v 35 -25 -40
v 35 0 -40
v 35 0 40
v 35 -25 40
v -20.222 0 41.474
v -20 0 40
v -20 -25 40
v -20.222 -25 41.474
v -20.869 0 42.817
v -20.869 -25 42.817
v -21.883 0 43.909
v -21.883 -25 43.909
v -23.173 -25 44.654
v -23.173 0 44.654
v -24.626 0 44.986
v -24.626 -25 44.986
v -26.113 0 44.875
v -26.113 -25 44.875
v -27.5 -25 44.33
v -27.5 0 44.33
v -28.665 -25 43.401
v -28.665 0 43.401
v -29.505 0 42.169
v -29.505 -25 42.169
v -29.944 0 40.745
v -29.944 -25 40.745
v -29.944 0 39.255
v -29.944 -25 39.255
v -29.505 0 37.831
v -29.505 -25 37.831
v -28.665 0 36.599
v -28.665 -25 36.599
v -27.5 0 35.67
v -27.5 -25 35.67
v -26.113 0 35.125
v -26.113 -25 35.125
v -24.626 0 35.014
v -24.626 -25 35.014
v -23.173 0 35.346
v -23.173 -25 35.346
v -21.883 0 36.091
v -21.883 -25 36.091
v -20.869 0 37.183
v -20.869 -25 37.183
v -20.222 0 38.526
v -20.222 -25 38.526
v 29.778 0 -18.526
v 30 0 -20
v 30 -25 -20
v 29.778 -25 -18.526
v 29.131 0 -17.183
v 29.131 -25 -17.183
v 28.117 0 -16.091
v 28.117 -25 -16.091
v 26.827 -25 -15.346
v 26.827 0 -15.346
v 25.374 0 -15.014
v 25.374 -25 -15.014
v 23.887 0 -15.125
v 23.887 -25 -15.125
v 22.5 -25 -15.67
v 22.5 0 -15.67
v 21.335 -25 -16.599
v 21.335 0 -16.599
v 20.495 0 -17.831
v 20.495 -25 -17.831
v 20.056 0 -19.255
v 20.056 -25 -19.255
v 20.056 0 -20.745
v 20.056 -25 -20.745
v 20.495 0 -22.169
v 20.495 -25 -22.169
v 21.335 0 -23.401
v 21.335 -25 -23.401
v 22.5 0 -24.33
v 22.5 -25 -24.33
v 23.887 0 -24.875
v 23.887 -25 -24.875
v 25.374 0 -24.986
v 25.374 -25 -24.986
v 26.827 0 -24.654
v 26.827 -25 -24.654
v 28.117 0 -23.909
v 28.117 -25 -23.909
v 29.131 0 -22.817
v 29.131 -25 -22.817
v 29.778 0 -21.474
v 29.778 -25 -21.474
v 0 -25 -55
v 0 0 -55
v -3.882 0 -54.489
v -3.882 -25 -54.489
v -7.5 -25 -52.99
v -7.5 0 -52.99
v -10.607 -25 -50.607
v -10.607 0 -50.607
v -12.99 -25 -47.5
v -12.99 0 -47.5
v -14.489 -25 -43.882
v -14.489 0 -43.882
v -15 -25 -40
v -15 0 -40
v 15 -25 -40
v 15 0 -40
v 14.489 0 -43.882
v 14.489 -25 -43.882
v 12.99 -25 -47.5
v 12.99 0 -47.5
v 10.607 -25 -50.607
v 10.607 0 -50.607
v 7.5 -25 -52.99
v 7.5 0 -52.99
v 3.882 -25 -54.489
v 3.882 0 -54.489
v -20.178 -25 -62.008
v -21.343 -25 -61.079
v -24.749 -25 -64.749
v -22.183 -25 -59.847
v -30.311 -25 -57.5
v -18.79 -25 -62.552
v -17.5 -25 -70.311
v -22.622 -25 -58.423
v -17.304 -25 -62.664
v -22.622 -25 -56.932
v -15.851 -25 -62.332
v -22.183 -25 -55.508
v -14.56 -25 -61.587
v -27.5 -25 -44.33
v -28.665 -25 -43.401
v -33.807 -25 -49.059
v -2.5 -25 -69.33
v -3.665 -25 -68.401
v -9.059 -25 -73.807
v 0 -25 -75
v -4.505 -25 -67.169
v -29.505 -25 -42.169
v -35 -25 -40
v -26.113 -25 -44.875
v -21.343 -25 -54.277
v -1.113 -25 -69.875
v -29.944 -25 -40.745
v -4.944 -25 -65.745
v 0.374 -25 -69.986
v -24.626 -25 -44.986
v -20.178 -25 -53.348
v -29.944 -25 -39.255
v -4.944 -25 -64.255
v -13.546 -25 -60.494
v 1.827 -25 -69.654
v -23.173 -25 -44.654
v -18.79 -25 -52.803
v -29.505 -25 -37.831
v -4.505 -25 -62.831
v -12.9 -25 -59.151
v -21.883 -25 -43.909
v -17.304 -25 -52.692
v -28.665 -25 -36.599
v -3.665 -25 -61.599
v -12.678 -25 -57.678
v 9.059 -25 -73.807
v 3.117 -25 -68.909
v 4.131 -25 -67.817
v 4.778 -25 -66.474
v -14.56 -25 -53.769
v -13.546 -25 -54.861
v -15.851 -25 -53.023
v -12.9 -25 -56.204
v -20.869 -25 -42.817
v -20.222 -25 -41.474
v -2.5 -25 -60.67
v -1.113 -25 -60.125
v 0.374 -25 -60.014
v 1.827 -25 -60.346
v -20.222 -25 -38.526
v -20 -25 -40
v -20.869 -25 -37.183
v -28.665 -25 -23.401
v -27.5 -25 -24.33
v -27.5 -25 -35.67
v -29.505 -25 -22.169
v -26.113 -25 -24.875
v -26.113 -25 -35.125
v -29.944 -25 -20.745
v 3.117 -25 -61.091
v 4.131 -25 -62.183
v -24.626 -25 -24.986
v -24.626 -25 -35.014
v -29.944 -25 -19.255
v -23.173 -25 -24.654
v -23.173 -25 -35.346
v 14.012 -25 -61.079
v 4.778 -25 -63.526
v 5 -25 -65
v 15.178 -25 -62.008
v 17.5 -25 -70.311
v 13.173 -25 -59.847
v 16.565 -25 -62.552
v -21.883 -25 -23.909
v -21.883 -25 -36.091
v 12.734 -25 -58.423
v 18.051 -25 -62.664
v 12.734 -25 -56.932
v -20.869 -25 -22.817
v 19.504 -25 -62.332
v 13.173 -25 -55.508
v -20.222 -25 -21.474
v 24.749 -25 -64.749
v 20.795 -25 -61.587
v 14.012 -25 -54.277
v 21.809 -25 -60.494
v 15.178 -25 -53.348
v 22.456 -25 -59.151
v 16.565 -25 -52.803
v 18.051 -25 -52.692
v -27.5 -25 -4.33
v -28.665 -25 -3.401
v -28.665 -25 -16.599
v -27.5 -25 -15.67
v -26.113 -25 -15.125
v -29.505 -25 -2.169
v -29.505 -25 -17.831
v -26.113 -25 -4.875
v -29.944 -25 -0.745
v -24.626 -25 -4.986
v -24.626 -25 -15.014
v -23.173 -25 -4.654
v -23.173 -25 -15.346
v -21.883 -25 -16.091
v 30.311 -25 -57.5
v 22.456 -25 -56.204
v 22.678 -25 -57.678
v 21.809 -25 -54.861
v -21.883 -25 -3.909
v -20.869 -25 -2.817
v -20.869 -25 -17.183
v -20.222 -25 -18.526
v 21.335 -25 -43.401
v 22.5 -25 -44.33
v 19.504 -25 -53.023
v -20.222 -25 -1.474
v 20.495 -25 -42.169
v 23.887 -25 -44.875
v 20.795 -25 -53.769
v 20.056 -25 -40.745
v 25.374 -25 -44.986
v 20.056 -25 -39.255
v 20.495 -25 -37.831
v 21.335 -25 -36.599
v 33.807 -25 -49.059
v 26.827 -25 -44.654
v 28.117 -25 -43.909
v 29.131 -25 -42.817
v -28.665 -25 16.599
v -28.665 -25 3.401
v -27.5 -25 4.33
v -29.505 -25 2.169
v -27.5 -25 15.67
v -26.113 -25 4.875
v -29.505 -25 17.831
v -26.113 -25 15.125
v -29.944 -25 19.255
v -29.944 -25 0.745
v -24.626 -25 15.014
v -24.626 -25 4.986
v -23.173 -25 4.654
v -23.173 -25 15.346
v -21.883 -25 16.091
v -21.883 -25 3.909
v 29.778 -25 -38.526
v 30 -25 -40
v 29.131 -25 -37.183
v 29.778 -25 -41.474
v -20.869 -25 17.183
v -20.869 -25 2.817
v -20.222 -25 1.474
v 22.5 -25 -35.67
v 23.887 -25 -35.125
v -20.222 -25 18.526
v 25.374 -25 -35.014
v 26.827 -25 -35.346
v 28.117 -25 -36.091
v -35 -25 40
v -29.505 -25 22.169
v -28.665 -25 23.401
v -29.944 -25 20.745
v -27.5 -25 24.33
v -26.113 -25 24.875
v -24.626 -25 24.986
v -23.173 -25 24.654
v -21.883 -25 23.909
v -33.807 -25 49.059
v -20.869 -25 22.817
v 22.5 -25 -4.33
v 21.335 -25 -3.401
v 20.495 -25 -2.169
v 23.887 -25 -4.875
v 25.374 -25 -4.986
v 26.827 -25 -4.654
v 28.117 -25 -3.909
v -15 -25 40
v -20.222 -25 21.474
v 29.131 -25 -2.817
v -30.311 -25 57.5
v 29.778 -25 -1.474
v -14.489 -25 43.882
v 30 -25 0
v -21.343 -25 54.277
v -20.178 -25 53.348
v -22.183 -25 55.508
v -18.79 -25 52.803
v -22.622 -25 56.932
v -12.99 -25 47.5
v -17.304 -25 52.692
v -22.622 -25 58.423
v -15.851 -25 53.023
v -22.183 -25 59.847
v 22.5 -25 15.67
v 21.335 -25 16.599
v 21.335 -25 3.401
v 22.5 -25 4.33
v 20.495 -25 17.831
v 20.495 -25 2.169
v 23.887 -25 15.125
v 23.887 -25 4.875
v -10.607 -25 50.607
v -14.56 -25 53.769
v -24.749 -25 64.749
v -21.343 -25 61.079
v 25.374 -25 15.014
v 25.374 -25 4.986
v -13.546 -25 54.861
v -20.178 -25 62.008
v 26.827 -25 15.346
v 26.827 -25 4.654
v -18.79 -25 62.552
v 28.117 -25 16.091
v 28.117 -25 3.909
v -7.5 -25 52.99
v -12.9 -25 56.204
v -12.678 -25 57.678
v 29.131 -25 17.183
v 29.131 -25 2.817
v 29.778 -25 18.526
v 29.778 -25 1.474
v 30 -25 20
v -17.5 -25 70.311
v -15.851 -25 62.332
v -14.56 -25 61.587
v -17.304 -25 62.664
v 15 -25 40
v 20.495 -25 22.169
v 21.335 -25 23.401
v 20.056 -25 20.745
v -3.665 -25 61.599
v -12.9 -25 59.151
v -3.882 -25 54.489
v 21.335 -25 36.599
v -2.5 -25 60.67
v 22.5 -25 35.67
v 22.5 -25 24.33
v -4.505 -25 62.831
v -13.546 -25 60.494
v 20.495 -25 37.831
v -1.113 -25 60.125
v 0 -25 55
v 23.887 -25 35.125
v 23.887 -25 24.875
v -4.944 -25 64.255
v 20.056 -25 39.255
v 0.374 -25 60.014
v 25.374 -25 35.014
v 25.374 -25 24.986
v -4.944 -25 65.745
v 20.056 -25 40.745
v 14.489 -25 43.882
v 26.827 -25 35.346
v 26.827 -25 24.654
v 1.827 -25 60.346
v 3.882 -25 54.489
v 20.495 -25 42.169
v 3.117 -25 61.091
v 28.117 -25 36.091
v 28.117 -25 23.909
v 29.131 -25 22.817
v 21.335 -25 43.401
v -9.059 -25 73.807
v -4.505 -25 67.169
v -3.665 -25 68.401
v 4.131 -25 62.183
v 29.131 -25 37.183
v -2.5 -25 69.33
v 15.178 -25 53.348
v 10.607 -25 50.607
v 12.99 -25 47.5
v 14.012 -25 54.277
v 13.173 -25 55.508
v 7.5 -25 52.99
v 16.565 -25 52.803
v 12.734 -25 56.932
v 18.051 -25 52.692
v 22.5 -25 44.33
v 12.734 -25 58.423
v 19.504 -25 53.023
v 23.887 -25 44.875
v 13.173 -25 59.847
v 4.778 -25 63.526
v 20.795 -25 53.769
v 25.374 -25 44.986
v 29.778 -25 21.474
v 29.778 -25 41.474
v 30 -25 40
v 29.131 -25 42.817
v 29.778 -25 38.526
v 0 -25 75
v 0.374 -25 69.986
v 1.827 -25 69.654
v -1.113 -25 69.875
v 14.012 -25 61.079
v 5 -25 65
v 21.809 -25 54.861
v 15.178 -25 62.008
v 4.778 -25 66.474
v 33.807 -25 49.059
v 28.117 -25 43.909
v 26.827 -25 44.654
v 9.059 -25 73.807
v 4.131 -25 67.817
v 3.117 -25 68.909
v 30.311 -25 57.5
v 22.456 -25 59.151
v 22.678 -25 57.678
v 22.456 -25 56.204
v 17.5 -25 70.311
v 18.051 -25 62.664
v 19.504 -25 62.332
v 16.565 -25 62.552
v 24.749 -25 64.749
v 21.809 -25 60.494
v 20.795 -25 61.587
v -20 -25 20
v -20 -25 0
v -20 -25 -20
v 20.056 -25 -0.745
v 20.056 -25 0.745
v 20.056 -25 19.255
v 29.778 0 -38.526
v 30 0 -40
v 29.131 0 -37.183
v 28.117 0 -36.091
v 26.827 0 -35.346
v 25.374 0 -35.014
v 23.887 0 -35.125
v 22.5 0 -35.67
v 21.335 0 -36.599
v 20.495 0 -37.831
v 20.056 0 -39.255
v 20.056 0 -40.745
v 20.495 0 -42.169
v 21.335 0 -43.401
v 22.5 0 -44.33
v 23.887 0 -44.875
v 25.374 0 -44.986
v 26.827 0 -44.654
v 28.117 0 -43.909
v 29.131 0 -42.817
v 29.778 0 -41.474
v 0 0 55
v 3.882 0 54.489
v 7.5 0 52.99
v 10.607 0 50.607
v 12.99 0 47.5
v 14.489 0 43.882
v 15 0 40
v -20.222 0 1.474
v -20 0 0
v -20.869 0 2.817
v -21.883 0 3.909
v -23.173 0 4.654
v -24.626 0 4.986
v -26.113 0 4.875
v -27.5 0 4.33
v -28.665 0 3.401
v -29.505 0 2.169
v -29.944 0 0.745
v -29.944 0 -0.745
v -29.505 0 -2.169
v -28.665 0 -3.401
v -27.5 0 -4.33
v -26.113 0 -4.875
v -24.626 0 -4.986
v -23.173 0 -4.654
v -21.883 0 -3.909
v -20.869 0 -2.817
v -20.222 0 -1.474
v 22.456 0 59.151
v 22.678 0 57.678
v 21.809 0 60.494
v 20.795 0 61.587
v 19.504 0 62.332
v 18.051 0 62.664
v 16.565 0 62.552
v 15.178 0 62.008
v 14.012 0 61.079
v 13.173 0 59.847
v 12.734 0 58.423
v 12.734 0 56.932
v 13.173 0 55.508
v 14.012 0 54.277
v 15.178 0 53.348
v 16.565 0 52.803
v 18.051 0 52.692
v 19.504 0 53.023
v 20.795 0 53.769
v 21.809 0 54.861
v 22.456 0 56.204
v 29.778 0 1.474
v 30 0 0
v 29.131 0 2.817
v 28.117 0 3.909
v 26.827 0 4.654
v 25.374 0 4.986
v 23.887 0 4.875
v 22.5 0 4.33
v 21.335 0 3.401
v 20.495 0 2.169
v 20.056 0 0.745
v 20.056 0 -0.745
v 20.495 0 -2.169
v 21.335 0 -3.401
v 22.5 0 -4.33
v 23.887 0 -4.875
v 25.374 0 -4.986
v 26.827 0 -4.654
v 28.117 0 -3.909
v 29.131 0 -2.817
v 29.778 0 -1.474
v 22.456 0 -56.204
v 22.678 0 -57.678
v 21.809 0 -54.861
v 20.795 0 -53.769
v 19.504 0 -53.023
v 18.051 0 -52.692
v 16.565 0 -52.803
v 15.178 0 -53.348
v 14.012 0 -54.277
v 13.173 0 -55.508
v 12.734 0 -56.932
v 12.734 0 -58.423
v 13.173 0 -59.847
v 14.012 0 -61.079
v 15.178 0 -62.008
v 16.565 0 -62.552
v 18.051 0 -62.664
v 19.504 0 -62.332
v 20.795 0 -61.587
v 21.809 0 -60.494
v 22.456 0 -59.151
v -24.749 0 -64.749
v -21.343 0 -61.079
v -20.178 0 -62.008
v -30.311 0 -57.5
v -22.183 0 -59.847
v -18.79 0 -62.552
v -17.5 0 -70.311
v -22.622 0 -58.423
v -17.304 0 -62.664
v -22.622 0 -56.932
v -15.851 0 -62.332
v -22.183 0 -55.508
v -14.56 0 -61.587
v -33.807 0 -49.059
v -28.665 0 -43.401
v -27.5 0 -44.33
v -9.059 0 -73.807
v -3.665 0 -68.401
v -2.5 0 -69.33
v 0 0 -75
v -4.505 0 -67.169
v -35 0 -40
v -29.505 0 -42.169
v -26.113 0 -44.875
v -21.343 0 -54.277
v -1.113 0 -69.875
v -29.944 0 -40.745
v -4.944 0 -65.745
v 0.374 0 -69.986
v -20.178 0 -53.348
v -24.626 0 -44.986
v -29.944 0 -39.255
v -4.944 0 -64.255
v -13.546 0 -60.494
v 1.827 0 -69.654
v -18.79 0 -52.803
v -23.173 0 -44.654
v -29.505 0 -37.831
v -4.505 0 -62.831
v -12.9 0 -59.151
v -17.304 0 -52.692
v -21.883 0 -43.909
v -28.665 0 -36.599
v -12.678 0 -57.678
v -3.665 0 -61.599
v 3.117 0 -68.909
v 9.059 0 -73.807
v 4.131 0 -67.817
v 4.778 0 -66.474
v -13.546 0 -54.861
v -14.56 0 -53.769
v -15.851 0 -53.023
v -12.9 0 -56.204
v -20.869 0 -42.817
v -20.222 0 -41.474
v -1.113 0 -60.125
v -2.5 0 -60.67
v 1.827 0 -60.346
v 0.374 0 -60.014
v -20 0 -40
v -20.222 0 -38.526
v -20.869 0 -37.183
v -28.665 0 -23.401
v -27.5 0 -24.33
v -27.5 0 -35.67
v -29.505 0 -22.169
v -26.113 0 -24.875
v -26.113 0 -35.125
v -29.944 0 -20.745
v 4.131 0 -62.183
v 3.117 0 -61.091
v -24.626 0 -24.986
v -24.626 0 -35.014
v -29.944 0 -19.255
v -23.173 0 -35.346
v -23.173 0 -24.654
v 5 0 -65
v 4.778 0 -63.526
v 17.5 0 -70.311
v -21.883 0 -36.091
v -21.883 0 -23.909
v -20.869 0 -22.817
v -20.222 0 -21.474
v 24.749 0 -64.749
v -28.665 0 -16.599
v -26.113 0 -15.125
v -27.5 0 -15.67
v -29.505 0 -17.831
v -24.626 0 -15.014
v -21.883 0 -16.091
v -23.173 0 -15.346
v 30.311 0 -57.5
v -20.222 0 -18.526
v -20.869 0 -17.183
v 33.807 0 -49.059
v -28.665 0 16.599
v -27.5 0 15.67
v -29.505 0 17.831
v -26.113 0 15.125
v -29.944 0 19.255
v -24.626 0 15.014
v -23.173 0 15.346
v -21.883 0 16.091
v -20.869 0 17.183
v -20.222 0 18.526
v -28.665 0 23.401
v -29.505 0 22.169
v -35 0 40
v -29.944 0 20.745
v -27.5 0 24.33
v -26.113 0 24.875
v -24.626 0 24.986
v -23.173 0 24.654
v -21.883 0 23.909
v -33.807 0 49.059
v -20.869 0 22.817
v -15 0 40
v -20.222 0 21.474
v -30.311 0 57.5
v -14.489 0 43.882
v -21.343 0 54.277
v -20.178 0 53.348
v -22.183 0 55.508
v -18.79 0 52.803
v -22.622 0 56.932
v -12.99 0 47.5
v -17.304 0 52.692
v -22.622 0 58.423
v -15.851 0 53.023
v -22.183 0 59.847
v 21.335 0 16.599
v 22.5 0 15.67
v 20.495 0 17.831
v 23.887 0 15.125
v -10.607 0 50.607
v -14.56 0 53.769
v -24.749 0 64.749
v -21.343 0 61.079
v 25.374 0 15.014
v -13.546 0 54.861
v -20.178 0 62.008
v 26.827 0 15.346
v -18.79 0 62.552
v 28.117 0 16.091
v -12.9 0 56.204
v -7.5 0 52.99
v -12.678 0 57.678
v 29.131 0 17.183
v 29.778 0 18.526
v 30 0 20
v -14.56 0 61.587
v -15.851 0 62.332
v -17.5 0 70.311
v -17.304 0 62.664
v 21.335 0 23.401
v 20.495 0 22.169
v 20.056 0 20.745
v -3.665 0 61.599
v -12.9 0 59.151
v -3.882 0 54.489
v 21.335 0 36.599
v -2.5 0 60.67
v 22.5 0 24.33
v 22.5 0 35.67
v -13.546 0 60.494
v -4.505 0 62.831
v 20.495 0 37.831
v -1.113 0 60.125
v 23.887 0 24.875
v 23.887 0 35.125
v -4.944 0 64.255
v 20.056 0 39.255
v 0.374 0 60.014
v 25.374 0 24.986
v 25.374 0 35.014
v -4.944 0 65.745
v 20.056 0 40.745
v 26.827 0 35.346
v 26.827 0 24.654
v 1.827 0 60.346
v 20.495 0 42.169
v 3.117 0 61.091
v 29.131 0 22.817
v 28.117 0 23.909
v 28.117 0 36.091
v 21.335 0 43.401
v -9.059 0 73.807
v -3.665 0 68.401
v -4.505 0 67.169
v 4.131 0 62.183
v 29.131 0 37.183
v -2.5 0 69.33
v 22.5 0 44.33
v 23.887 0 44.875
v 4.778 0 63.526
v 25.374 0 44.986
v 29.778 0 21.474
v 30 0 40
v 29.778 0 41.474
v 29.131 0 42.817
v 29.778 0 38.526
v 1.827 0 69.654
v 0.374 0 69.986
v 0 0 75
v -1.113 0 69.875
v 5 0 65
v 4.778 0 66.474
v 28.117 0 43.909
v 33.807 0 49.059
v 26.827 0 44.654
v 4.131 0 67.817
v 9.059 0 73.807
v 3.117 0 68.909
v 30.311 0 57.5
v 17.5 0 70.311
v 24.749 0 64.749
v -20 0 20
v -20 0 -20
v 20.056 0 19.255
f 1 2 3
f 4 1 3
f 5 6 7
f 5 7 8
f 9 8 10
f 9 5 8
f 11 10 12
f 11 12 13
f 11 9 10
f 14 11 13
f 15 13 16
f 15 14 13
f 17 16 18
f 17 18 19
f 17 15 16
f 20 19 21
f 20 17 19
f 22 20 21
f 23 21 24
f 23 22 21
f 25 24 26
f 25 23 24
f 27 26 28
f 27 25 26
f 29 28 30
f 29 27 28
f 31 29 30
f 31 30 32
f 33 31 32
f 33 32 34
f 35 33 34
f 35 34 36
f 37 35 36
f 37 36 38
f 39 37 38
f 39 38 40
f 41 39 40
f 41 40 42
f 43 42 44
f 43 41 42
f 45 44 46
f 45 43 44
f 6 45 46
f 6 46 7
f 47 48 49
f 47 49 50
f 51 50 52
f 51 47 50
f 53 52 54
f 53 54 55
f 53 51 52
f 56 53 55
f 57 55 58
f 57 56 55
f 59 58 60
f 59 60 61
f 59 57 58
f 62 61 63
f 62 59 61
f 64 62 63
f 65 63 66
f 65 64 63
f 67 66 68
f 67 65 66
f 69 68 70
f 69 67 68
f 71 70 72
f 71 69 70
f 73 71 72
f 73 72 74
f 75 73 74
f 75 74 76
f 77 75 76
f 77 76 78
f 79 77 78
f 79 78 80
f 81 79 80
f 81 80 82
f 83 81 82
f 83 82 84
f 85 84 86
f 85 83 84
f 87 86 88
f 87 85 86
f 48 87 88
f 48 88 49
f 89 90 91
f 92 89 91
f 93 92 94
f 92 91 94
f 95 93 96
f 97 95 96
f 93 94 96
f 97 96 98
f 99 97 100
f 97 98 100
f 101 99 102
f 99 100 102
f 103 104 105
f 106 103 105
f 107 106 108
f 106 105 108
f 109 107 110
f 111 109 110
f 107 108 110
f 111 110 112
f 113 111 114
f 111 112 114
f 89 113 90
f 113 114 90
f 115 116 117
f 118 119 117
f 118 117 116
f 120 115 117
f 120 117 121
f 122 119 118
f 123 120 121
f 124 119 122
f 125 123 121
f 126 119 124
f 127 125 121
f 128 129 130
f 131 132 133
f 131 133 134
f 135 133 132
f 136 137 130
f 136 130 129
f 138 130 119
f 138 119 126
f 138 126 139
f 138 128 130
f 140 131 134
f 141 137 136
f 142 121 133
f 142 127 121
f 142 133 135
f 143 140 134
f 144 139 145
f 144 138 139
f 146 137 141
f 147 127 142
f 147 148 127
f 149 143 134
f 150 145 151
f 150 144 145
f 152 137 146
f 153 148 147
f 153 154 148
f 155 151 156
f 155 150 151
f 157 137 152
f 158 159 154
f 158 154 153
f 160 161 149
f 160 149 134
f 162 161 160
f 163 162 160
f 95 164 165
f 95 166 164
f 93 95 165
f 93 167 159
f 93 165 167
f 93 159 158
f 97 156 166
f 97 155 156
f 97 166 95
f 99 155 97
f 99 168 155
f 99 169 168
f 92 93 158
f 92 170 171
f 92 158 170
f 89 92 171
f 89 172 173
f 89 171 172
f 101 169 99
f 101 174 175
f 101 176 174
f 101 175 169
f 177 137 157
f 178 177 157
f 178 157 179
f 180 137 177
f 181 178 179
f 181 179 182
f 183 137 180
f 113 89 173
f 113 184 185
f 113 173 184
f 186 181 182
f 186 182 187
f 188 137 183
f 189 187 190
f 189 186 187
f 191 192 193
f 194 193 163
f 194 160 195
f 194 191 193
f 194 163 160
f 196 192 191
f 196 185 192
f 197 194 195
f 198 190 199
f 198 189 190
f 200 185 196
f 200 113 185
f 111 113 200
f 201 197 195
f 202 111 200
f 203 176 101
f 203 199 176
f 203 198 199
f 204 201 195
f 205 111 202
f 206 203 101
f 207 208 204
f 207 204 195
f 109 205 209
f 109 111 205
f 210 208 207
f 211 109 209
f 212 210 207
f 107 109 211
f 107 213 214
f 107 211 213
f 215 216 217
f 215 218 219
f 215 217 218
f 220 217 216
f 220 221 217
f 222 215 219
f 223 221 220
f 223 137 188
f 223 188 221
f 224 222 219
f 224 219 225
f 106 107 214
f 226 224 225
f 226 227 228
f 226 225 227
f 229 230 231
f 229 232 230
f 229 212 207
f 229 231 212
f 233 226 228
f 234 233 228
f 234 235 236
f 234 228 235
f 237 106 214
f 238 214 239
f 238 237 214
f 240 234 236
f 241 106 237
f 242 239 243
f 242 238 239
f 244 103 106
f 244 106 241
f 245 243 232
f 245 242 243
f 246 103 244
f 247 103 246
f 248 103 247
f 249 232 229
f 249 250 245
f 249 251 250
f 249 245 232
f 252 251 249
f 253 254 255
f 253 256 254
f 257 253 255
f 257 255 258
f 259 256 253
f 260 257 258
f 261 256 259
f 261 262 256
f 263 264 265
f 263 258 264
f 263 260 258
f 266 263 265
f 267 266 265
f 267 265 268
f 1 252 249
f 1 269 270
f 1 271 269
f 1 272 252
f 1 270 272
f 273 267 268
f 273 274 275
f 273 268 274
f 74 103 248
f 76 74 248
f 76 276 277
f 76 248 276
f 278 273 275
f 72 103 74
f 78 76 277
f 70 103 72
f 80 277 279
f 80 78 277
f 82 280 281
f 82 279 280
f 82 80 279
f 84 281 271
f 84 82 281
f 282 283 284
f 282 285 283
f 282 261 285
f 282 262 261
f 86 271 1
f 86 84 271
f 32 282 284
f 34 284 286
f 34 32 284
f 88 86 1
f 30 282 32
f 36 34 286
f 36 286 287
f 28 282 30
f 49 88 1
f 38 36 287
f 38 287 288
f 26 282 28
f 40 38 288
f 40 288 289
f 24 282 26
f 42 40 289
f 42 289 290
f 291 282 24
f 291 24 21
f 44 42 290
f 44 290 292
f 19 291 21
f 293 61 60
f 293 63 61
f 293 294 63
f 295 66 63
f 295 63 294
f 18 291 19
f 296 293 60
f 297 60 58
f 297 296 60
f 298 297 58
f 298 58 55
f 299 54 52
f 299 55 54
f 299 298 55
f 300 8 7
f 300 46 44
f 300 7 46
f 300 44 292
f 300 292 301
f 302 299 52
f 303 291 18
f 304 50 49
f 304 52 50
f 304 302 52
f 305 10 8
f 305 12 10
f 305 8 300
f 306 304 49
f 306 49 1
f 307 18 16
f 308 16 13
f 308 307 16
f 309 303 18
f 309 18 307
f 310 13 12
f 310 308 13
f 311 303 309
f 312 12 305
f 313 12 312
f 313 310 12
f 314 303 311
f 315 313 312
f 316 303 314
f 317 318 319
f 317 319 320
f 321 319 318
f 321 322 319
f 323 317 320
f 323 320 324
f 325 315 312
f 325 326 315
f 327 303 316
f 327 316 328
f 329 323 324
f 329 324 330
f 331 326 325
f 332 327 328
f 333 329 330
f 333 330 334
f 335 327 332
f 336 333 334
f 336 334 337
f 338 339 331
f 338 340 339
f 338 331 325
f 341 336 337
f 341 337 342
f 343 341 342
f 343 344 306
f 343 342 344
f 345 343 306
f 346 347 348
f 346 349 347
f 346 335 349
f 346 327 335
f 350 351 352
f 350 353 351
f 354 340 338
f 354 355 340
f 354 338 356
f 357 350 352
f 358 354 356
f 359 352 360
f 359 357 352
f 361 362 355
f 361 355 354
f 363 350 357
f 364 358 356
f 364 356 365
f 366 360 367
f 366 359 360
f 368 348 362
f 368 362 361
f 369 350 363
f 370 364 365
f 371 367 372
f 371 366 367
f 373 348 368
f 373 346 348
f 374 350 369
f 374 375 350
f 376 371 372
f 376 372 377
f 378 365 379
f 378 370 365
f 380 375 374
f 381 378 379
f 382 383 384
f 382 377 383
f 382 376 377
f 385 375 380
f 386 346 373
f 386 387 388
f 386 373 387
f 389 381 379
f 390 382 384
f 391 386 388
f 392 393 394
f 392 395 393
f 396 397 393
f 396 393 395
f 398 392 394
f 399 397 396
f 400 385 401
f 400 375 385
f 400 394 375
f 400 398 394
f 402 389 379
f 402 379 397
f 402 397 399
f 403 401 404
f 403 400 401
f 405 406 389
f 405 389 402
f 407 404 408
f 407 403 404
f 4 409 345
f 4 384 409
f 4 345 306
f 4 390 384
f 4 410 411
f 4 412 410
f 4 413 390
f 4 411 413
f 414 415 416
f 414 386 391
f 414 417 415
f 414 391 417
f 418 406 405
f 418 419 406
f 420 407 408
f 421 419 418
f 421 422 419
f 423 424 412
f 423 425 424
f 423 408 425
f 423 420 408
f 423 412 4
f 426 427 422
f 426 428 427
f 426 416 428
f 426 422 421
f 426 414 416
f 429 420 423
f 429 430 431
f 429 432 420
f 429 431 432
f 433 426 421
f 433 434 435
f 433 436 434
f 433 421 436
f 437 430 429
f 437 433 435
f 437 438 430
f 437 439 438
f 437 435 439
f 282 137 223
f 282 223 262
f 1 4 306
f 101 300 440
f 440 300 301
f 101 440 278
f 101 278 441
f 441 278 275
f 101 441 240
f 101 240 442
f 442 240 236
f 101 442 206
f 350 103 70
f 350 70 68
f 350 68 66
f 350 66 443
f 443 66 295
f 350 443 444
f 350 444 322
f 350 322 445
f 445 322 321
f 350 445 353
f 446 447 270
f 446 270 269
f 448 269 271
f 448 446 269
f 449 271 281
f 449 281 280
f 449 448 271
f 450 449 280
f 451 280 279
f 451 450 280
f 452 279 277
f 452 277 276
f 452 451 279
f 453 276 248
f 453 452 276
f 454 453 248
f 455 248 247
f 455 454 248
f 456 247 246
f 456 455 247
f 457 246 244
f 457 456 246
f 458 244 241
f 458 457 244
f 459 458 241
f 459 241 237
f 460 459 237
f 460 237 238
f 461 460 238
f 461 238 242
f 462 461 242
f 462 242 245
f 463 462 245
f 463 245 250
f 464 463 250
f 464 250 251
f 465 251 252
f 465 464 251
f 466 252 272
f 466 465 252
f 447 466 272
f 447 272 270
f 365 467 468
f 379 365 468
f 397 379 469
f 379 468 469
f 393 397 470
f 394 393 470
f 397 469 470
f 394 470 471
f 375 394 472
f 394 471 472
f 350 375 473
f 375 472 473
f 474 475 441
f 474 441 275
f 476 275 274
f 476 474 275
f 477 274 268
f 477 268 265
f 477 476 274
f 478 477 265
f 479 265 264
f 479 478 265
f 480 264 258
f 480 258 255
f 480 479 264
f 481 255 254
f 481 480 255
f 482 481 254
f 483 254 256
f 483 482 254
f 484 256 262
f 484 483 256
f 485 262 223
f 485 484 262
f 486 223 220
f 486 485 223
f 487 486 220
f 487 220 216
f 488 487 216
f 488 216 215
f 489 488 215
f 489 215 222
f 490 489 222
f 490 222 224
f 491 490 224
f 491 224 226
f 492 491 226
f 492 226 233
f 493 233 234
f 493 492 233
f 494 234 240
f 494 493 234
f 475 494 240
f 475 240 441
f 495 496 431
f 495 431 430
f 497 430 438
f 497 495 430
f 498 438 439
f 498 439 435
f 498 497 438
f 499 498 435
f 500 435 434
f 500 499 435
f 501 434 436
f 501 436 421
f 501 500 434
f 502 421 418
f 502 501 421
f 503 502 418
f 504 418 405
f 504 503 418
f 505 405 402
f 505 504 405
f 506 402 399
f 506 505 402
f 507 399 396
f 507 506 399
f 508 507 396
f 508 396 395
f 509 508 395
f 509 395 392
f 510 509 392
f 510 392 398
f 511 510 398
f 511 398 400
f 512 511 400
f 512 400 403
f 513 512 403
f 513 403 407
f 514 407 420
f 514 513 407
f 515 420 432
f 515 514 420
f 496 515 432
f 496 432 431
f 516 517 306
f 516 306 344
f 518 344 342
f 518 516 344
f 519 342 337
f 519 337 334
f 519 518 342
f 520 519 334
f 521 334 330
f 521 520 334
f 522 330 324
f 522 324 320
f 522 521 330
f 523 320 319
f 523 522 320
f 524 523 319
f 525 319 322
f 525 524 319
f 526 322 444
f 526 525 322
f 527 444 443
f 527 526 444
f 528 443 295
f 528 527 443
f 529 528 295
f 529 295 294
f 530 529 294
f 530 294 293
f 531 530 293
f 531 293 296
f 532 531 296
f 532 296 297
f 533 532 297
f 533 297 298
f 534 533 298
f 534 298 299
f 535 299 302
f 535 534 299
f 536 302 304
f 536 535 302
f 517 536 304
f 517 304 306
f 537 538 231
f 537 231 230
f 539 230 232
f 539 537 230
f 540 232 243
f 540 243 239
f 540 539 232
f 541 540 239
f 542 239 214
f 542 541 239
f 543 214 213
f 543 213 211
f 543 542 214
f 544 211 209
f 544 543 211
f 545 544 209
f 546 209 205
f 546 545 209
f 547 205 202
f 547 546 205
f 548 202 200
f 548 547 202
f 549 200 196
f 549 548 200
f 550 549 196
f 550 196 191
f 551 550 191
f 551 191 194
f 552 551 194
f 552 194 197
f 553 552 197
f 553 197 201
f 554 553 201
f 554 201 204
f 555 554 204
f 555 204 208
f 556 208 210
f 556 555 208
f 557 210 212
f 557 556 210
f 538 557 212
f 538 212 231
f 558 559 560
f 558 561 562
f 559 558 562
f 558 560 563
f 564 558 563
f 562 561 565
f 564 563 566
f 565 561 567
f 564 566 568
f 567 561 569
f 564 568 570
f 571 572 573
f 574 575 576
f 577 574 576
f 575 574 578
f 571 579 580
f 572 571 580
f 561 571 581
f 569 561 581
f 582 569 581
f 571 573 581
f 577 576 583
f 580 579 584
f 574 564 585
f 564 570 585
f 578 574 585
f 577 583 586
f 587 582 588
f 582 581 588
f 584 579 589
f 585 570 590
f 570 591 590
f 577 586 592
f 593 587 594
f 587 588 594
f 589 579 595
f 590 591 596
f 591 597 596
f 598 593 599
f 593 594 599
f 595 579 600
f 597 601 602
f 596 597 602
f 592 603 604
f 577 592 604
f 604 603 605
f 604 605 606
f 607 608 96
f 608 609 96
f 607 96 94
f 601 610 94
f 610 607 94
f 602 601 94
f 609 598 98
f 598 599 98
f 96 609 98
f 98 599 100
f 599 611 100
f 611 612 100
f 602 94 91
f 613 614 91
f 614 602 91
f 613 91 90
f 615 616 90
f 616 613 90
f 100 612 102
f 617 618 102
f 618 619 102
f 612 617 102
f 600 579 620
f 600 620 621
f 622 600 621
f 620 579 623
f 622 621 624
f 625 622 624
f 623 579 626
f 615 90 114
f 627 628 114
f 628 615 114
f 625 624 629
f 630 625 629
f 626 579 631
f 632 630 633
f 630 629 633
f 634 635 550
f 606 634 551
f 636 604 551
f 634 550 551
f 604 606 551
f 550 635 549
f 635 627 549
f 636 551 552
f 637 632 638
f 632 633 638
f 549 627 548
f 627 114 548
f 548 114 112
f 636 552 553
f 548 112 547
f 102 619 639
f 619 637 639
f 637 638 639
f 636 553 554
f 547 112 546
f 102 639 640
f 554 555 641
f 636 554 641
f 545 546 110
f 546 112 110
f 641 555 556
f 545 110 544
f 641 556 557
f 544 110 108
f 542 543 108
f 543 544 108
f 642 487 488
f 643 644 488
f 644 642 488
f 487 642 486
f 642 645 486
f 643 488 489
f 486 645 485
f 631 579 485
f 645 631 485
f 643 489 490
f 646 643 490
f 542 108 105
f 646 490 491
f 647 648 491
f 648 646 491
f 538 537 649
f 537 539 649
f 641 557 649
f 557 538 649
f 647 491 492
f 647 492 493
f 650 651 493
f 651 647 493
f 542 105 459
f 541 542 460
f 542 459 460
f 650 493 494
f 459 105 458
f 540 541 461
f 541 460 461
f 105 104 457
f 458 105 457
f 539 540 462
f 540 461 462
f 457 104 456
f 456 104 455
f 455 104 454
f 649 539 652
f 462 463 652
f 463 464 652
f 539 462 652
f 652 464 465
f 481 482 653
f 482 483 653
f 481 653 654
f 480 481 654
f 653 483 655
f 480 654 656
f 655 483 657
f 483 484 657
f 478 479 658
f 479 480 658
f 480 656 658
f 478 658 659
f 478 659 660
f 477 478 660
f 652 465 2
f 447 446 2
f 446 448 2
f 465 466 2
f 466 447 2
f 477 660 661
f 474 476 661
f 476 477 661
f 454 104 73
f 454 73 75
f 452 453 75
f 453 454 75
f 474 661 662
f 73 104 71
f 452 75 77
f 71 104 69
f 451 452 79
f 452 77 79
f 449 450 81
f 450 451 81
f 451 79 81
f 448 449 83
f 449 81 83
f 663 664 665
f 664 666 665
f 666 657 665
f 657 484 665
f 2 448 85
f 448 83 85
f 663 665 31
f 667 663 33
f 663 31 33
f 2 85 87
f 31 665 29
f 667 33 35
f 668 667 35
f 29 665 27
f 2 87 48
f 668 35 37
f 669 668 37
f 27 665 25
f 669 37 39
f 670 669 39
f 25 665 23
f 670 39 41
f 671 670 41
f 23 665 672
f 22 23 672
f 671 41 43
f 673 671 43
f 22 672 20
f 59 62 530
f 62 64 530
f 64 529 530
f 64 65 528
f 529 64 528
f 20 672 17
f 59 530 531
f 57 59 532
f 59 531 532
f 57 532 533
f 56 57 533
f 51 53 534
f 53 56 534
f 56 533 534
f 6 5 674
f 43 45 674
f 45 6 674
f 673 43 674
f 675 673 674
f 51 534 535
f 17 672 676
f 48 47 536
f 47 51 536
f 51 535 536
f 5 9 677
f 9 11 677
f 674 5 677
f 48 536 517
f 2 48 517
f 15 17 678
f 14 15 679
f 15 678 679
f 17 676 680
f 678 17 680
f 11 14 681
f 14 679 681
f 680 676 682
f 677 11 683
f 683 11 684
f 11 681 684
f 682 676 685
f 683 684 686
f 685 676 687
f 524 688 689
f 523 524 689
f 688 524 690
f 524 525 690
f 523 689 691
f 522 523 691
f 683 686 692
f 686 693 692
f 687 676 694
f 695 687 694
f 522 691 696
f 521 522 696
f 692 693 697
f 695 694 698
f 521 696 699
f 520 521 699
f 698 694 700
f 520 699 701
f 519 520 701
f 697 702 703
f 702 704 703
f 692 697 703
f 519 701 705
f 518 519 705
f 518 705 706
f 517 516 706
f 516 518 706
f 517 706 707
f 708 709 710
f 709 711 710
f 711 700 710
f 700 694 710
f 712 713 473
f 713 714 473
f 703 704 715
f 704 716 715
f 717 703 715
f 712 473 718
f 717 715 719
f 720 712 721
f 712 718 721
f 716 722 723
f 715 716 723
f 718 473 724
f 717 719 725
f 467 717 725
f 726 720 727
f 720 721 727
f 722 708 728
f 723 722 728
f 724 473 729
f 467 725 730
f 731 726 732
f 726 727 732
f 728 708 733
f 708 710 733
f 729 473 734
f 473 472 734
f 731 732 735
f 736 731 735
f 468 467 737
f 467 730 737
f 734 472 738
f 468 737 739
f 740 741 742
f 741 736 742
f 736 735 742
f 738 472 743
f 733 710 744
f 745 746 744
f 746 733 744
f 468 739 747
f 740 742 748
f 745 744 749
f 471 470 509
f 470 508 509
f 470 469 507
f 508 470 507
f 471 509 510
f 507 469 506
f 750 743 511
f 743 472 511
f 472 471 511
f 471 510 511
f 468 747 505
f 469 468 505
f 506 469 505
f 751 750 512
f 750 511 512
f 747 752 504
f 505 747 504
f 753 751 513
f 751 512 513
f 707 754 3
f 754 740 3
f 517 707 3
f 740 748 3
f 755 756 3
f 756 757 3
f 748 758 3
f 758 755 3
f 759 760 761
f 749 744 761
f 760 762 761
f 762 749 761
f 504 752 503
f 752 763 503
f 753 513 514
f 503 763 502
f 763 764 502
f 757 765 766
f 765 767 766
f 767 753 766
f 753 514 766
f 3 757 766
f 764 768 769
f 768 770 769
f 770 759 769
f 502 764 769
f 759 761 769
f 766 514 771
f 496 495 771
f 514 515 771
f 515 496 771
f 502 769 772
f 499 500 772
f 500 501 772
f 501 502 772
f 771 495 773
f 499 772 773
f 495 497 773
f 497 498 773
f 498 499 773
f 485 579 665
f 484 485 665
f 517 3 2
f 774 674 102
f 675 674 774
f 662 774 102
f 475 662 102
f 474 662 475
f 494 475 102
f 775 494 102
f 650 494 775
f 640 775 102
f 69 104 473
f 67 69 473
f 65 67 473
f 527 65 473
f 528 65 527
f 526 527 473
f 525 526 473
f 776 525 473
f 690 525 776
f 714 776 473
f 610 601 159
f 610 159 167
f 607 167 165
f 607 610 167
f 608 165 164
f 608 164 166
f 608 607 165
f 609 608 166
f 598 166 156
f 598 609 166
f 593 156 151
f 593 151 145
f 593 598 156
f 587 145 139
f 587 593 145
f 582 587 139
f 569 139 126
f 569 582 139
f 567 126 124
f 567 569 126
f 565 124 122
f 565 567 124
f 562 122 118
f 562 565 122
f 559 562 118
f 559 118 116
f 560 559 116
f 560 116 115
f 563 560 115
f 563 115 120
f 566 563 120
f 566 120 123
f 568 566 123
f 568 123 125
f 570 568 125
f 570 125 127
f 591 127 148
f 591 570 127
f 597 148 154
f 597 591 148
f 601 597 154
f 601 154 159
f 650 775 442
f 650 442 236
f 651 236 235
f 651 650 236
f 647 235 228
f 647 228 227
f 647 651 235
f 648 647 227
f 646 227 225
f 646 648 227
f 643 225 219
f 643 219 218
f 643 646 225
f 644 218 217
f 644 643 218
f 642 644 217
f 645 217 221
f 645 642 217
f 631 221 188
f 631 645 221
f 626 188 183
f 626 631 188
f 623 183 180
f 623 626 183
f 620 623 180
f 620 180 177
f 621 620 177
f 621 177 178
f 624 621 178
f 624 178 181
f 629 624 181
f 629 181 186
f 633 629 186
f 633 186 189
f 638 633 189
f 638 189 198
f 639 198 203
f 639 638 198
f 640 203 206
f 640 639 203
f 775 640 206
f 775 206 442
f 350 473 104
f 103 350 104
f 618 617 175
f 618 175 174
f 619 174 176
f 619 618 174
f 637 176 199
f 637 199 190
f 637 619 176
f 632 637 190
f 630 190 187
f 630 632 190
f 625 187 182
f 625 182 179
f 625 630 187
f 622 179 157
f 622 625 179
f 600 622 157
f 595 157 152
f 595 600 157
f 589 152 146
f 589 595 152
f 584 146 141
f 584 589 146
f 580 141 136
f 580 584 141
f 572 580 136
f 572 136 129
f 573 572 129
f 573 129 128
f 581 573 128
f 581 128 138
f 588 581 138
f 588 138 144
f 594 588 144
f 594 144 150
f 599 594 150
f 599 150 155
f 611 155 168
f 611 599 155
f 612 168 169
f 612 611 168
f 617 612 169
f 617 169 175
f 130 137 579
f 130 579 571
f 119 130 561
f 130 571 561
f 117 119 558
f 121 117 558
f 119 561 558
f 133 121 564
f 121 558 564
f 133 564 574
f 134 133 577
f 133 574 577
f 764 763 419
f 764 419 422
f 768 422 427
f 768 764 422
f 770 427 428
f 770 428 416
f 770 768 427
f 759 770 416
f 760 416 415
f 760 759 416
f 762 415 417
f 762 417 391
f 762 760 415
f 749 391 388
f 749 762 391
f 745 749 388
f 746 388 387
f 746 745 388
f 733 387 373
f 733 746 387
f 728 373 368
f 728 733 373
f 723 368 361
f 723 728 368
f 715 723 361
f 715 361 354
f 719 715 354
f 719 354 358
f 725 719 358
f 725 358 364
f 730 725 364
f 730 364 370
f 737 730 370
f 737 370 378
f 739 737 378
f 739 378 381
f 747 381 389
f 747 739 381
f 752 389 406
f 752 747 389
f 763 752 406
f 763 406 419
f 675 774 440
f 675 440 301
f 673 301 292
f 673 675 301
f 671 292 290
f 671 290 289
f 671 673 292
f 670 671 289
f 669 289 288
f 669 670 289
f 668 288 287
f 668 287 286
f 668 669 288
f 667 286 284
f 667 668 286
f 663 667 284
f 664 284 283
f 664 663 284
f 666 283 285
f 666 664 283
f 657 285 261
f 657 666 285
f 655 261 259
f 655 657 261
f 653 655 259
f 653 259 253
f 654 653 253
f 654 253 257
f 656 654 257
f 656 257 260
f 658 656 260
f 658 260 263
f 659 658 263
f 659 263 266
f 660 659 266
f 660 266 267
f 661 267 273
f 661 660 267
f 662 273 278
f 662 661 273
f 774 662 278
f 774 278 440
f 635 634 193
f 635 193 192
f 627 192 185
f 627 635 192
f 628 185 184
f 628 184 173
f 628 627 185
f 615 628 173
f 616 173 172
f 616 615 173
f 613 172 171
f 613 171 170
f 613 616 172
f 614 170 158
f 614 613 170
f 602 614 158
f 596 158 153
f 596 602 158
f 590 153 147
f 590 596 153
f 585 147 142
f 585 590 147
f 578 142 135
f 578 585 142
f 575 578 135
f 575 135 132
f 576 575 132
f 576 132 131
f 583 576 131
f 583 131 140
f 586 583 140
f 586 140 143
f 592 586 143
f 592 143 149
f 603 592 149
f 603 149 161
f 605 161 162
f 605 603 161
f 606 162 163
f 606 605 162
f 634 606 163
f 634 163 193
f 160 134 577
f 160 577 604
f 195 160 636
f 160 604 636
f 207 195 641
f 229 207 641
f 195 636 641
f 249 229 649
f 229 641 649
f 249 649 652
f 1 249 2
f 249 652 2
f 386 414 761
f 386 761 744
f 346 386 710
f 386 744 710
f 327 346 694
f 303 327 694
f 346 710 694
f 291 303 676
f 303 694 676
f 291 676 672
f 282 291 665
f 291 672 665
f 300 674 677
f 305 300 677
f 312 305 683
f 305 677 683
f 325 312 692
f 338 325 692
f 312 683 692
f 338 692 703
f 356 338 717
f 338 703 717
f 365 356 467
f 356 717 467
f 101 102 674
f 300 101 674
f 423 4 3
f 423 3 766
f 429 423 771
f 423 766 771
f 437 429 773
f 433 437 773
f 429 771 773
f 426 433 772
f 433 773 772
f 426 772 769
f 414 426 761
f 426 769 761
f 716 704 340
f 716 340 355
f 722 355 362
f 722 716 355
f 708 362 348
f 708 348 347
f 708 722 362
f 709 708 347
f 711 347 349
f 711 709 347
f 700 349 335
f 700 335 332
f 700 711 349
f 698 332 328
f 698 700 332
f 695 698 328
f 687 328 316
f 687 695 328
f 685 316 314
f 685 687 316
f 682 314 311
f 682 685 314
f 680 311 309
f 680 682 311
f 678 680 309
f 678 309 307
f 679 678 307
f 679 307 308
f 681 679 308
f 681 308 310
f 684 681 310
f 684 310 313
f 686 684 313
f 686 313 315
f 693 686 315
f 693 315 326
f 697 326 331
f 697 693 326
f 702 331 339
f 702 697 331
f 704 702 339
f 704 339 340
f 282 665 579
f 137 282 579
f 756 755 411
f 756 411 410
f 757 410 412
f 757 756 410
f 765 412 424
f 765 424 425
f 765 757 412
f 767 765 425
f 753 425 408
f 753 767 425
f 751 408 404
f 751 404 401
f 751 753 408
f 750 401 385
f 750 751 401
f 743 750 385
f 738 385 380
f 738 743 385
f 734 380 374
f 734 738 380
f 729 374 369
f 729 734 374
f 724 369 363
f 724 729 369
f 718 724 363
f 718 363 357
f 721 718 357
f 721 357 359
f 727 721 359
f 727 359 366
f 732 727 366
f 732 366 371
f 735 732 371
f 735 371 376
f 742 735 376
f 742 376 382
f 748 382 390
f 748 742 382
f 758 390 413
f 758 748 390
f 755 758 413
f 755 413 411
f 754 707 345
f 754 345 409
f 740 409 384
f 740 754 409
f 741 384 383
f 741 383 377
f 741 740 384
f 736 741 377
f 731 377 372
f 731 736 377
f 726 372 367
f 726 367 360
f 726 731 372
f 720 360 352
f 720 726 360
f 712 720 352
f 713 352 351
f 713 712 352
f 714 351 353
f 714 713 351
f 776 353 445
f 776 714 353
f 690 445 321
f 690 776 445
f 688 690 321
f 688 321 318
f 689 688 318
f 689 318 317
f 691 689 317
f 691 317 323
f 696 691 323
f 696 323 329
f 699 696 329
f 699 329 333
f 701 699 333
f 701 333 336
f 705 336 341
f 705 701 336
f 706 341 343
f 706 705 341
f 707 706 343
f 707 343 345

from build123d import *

# Parameters (mm, degrees)
F0_R     = 5
F1_DEPTH = 25


with BuildPart() as f1:
    # F0 (on Front) → F1 (new body)
    with BuildSketch(Plane.XZ):
        with BuildLine():
            ThreePointArc((0, 75), (-24.748737, 64.748737), (-35, 40))
            Line((-35, 40), (-35, 0))
            Line((-35, 0), (-35, -40))
            ThreePointArc((-35, -40), (-24.748737, -64.748737), (0, -75))
            ThreePointArc((0, -75), (24.748737, -64.748737), (35, -40))
            Line((35, -40), (35, 0))
            Line((35, 0), (35, 40))
            ThreePointArc((35, 40), (24.748737, 64.748737), (0, 75))
        make_face()
        with Locations((-17.67767, -57.67767)):
            Circle(F0_R, mode=Mode.SUBTRACT)
        with Locations((-25, -40)):
            Circle(F0_R, mode=Mode.SUBTRACT)
        with Locations((-25, -20)):
            Circle(F0_R, mode=Mode.SUBTRACT)
        with Locations((0, -65)):
            Circle(F0_R, mode=Mode.SUBTRACT)
        with Locations((17.67767, -57.67767)):
            Circle(F0_R, mode=Mode.SUBTRACT)
        with Locations((25, -40)):
            Circle(F0_R, mode=Mode.SUBTRACT)
        with Locations((25, -20)):
            Circle(F0_R, mode=Mode.SUBTRACT)
        with Locations((-25, 0)):
            Circle(F0_R, mode=Mode.SUBTRACT)
        with Locations((-25, 20)):
            Circle(F0_R, mode=Mode.SUBTRACT)
        with Locations((-25, 40)):
            Circle(F0_R, mode=Mode.SUBTRACT)
        with Locations((-17.67767, 57.67767)):
            Circle(F0_R, mode=Mode.SUBTRACT)
        with BuildLine():
            ThreePointArc((-15, 40), (-10.606602, 50.606602), (0, 55))
            ThreePointArc((0, 55), (10.606602, 50.606602), (15, 40))
            Line((15, 40), (15, 0))
            Line((15, 0), (15, -40))
            ThreePointArc((15, -40), (10.606602, -50.606602), (0, -55))
            ThreePointArc((0, -55), (-10.606602, -50.606602), (-15, -40))
            Line((-15, -40), (-15, 0))
            Line((-15, 0), (-15, 40))
        make_face(mode=Mode.SUBTRACT)
        with Locations((25, 0)):
            Circle(F0_R, mode=Mode.SUBTRACT)
        with Locations((25, 20)):
            Circle(F0_R, mode=Mode.SUBTRACT)
        with Locations((0, 65)):
            Circle(F0_R, mode=Mode.SUBTRACT)
        with Locations((25, 40)):
            Circle(F0_R, mode=Mode.SUBTRACT)
        with Locations((17.67767, 57.67767)):
            Circle(F0_R, mode=Mode.SUBTRACT)
    extrude(amount=F1_DEPTH)


solid = f1.part
